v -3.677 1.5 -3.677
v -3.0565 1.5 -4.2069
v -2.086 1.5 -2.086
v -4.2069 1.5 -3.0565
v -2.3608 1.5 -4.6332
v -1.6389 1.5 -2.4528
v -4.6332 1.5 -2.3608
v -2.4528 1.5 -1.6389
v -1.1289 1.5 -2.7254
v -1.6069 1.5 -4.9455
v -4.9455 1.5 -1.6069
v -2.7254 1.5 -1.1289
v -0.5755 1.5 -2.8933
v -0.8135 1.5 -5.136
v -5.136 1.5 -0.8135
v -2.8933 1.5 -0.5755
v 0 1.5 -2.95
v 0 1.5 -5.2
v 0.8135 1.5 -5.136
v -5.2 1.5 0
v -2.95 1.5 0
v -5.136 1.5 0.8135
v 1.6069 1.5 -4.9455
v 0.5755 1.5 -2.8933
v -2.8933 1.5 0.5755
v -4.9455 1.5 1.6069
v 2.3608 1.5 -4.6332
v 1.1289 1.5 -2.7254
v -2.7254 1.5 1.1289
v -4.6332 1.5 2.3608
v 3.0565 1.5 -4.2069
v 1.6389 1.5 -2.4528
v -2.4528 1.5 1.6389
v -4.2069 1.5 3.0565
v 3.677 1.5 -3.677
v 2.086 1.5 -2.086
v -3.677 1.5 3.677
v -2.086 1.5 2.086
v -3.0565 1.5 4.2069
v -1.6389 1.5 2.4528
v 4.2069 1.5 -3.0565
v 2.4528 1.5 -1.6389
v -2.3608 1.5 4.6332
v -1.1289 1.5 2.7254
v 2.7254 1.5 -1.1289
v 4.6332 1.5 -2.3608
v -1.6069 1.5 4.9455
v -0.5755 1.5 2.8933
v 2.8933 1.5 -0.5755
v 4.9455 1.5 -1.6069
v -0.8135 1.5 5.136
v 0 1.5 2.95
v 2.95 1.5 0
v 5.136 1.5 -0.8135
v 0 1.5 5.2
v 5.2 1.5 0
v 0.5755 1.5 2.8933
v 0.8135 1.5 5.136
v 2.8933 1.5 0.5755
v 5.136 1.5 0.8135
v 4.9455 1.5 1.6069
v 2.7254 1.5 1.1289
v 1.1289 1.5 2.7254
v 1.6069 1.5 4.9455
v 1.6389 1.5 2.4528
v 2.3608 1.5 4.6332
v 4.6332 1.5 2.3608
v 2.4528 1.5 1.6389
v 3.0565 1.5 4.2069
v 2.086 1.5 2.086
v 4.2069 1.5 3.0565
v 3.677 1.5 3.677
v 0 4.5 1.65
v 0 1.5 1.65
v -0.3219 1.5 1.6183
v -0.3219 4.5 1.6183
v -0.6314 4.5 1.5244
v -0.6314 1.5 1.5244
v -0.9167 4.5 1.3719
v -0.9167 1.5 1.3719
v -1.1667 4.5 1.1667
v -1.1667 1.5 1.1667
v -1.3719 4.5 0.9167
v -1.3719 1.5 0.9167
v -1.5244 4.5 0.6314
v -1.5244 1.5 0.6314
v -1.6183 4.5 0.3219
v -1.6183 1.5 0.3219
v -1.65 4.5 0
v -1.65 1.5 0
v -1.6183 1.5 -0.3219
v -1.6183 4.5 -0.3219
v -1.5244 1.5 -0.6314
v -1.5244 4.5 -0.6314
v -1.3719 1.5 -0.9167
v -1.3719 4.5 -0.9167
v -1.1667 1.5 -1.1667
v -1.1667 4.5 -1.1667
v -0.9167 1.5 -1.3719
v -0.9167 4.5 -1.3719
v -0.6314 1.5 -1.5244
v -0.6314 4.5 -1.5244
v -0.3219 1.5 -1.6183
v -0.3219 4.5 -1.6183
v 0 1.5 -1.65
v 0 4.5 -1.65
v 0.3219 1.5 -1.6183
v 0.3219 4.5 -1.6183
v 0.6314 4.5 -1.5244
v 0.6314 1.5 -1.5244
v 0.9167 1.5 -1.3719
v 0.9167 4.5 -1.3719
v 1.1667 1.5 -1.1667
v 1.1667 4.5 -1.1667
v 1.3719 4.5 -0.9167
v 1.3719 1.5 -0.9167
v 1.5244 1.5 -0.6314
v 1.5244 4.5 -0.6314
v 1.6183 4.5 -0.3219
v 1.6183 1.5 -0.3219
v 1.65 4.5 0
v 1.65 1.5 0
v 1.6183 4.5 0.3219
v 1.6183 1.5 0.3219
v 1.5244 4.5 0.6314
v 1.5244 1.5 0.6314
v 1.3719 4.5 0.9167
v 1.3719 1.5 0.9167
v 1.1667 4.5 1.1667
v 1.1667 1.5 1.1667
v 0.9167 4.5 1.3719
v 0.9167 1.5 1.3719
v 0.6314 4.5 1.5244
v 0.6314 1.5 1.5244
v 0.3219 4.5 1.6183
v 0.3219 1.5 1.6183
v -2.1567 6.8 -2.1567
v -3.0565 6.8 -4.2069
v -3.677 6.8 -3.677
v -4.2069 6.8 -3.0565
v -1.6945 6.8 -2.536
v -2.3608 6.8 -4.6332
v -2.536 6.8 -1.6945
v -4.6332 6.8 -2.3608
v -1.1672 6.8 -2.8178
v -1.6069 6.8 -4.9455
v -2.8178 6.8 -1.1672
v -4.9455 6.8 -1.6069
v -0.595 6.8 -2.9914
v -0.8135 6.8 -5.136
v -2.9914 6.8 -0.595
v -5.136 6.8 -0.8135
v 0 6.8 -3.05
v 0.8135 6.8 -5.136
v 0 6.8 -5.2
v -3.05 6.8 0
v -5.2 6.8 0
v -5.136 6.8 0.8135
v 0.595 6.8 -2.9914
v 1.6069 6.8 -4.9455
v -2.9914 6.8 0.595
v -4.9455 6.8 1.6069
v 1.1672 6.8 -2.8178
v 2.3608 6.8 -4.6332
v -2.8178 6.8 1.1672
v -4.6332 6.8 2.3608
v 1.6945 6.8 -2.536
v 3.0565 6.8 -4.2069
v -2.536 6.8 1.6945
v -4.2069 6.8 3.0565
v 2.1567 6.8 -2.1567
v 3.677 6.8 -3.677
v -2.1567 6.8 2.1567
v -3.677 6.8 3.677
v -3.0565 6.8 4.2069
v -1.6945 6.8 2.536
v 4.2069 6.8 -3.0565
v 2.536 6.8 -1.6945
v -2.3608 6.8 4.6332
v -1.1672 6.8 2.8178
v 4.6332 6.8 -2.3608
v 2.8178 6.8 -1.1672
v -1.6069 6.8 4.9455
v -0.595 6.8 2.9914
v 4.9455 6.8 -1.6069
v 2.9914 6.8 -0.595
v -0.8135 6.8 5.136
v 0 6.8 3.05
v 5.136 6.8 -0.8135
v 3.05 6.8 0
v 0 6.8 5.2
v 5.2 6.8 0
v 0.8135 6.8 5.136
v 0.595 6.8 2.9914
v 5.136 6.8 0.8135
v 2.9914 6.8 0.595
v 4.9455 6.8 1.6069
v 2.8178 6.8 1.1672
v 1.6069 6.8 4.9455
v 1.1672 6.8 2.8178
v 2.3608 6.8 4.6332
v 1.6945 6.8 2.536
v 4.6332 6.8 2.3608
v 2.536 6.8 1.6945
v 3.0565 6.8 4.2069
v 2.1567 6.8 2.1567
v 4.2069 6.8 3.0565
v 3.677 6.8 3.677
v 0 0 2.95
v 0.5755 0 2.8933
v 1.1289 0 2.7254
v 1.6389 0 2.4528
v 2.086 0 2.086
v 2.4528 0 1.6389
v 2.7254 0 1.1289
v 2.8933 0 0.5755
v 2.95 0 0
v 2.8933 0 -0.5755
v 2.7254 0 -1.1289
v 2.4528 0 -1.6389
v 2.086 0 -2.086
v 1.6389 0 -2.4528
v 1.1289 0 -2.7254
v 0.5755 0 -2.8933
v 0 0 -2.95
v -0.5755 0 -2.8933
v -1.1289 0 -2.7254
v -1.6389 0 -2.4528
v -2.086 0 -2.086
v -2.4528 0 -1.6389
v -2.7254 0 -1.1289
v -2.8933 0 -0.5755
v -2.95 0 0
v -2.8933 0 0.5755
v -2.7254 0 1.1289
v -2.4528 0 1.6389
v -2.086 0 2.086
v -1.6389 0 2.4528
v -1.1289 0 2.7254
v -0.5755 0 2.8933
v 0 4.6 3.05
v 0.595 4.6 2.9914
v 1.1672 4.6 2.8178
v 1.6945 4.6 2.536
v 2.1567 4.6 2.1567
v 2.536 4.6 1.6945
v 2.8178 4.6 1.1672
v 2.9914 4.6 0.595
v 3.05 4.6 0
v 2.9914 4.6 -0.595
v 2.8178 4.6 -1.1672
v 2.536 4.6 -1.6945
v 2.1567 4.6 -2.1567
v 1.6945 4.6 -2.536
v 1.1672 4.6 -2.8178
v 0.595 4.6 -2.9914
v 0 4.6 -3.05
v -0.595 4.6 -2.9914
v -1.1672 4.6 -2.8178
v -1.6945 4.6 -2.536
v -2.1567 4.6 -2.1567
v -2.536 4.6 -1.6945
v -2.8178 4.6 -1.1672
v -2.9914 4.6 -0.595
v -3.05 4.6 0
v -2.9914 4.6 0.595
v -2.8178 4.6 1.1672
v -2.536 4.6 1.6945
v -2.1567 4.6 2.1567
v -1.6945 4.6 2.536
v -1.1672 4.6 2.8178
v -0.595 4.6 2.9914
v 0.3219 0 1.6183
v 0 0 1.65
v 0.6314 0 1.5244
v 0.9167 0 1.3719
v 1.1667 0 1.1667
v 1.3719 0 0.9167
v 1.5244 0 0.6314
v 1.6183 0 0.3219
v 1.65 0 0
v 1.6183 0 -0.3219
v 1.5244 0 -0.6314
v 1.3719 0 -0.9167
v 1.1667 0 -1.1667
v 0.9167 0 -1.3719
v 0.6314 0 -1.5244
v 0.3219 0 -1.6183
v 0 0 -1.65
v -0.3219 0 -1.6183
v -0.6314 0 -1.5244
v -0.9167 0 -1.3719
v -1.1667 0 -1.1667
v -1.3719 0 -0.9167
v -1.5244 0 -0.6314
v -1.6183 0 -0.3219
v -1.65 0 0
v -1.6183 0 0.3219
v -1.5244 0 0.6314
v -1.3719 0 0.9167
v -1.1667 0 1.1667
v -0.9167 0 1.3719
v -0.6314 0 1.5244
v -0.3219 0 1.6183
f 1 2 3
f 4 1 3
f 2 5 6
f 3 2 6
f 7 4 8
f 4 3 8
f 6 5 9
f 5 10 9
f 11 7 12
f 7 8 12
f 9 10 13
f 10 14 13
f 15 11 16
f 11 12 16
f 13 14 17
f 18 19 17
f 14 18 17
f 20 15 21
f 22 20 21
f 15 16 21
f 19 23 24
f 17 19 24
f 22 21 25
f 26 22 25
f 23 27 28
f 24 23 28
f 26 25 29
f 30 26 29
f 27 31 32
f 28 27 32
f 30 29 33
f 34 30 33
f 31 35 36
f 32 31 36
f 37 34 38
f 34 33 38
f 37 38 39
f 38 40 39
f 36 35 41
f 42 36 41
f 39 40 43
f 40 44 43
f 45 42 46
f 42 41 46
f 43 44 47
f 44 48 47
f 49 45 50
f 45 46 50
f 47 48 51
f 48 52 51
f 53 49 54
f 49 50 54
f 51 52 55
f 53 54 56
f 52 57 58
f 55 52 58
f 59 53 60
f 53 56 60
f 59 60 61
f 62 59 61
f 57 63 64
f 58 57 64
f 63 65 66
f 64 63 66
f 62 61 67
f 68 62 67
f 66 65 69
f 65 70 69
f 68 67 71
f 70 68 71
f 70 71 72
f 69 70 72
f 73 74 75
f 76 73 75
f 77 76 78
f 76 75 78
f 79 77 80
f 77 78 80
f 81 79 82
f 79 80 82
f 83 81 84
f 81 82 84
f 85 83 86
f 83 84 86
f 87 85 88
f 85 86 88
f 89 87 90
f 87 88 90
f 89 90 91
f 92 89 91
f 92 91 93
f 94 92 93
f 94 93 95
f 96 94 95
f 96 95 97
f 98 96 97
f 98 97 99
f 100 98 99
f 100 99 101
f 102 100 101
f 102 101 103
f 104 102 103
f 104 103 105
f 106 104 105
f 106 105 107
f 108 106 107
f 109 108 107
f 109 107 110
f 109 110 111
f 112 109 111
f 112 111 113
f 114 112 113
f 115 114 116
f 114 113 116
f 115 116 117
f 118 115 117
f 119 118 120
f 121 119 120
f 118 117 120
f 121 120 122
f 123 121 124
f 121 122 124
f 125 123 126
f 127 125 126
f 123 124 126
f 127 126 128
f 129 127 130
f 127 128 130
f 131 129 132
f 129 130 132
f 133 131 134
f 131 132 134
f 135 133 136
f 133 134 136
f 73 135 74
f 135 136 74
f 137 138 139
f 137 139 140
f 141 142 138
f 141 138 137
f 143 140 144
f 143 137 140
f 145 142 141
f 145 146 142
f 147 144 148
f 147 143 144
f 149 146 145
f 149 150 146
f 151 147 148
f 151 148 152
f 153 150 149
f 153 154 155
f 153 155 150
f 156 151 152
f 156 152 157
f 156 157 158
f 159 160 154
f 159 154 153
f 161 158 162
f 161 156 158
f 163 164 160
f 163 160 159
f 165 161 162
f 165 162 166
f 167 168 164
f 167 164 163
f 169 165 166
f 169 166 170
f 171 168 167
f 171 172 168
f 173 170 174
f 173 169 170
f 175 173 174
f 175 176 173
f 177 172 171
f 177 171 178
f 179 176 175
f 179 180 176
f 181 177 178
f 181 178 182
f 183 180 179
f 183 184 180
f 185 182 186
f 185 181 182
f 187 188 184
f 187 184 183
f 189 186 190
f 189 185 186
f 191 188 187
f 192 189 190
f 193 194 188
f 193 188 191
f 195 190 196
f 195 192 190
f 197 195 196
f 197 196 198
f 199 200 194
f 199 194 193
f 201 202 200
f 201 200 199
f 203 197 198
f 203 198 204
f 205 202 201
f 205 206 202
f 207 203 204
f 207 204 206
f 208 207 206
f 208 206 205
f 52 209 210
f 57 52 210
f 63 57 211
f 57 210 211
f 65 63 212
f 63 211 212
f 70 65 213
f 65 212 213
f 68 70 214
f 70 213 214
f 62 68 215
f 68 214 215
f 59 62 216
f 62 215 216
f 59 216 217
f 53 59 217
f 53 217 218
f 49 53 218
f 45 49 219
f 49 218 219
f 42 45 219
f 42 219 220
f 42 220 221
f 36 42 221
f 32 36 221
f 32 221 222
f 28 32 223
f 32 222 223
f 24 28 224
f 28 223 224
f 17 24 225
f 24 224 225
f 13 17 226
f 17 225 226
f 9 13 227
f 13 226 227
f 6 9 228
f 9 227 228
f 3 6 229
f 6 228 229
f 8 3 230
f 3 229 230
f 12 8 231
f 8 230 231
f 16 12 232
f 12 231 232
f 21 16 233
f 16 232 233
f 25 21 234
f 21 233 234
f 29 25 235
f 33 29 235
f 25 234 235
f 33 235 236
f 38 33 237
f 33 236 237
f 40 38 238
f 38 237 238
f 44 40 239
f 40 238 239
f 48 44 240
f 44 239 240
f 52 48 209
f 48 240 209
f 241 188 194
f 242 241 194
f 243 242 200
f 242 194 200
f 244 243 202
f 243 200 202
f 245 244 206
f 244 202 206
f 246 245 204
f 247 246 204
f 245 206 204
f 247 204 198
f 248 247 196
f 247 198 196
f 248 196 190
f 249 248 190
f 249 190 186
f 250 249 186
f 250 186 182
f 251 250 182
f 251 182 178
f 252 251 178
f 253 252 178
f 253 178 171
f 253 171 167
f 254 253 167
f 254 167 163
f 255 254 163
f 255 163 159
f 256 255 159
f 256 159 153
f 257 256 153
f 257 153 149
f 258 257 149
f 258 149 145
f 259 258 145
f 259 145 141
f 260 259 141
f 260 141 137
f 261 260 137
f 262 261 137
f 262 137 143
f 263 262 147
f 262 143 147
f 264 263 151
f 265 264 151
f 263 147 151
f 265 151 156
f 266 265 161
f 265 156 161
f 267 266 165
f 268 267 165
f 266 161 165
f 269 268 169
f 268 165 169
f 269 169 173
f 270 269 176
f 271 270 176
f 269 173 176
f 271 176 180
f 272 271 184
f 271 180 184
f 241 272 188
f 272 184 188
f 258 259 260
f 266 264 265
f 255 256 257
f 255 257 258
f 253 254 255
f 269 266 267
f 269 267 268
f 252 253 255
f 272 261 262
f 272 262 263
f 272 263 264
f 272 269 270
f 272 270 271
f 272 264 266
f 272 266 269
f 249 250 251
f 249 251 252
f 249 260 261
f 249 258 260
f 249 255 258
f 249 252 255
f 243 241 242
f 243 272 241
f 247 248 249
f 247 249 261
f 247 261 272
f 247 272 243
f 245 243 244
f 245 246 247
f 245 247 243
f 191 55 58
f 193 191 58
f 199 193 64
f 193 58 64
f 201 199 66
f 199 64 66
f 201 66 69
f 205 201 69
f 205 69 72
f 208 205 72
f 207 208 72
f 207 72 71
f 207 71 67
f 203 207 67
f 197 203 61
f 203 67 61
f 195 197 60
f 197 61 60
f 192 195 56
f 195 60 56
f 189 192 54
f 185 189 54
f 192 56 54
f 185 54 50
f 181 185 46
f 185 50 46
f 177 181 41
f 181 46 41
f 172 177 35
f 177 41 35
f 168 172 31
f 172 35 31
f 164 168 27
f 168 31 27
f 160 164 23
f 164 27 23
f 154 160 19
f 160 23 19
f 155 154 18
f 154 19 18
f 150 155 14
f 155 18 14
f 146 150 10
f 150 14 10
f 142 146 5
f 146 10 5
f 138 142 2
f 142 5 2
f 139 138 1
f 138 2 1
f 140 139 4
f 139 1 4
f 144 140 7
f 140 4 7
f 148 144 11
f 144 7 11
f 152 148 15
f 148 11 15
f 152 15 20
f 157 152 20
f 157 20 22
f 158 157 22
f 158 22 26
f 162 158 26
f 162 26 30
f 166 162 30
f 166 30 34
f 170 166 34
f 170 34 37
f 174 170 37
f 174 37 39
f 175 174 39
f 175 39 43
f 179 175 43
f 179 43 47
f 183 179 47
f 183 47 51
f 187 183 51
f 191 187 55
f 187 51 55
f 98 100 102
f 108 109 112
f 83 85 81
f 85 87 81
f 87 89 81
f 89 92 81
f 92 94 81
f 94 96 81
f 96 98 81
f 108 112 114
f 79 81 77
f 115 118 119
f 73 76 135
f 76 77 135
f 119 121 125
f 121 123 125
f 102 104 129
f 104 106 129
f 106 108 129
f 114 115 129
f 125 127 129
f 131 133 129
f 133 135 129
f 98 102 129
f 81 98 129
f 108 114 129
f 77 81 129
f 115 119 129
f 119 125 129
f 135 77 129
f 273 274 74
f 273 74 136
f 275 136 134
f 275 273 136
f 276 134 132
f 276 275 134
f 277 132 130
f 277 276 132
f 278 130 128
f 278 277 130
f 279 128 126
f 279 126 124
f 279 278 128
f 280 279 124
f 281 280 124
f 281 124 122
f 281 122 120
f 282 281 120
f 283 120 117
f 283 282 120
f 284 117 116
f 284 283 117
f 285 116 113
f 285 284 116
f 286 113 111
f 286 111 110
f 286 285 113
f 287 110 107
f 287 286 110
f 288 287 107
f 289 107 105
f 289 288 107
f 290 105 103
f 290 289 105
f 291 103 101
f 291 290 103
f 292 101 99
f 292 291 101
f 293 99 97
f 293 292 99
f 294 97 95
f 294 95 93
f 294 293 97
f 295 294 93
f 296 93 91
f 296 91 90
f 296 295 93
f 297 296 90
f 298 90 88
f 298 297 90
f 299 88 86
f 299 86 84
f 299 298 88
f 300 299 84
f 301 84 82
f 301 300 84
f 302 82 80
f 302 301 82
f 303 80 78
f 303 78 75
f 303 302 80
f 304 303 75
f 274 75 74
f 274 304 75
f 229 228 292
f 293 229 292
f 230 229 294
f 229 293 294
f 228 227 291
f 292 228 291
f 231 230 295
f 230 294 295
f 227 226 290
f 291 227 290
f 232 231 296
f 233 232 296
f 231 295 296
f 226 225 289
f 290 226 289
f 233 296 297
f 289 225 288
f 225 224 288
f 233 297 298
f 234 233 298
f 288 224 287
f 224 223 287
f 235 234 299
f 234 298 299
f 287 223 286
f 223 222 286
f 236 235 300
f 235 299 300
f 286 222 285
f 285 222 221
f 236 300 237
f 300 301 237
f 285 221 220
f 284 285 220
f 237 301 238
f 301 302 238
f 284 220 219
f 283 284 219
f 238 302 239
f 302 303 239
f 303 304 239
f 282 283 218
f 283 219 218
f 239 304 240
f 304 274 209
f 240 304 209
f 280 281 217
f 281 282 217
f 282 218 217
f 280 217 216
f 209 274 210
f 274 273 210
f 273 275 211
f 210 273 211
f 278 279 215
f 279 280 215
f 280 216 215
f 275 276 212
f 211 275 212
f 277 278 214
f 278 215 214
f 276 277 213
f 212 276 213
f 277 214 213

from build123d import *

# Parameters (mm, degrees)
CROQUIS1_R              = 2.95
CROQUIS1_R_2            = 1.65
SALIENTE_EXTRUIR1_DEPTH = 1.5
CROQUIS2_R              = 5.2
SALIENTE_EXTRUIR2_DEPTH = 5.3
CROQUIS3_R              = 3.05
CORTAR_EXTRUIR1_DEPTH   = 2.3
CROQUIS4_R              = 1.65
CORTAR_EXTRUIR2_DEPTH   = 4.6
SALIENTE_EXTRUIR3_START = 0.1
CROQUIS5_R              = 3.05
SALIENTE_EXTRUIR3_DEPTH = 0.1


with BuildPart() as part:
    # Croquis1 → Saliente-Extruir1 (new body)
    with BuildSketch(Plane(origin=(0, 0, 0), x_dir=(1, 0, 0), z_dir=(0, 1, 0))):
        with Locations(Location((0, 0, 0), (0, 0, 270))):
            Circle(CROQUIS1_R)
        with Locations(Location((0, 0, 0), (0, 0, 270))):
            Circle(CROQUIS1_R_2, mode=Mode.SUBTRACT)
    extrude(amount=SALIENTE_EXTRUIR1_DEPTH)

    # Croquis2 → Saliente-Extruir2 (add)
    with BuildSketch(Plane(origin=(0, 1.5, 0), x_dir=(1, 0, 0), z_dir=(0, 1, 0))):
        with Locations(Location((0, 0, 0), (0, 0, 270))):
            Circle(CROQUIS2_R)
    extrude(amount=SALIENTE_EXTRUIR2_DEPTH)

    # Croquis3 → Cortar-Extruir1 (cut)
    with BuildSketch(Plane(origin=(0, 6.8, 0), x_dir=(1, 0, 0), z_dir=(0, 1, 0))):
        with Locations(Location((0, 0, 0), (0, 0, 270))):
            Circle(CROQUIS3_R)
    extrude(amount=-CORTAR_EXTRUIR1_DEPTH, mode=Mode.SUBTRACT)

    # Croquis4 → Cortar-Extruir2 (cut)
    with BuildSketch(Plane.XZ):
        with Locations(Location((0, 0, 0), (0, 0, 90))):
            Circle(CROQUIS4_R)
    extrude(amount=-CORTAR_EXTRUIR2_DEPTH, mode=Mode.SUBTRACT)

    # Croquis5 → Saliente-Extruir3 (add)
    with BuildSketch(Plane(origin=(0, 4.5, 0), x_dir=(1, 0, 0), z_dir=(0, 1, 0)).offset(SALIENTE_EXTRUIR3_START)):
        with Locations(Location((0, 0, 0), (0, 0, 270))):
            Circle(CROQUIS5_R)
    extrude(amount=-SALIENTE_EXTRUIR3_DEPTH)


solid = part.part
